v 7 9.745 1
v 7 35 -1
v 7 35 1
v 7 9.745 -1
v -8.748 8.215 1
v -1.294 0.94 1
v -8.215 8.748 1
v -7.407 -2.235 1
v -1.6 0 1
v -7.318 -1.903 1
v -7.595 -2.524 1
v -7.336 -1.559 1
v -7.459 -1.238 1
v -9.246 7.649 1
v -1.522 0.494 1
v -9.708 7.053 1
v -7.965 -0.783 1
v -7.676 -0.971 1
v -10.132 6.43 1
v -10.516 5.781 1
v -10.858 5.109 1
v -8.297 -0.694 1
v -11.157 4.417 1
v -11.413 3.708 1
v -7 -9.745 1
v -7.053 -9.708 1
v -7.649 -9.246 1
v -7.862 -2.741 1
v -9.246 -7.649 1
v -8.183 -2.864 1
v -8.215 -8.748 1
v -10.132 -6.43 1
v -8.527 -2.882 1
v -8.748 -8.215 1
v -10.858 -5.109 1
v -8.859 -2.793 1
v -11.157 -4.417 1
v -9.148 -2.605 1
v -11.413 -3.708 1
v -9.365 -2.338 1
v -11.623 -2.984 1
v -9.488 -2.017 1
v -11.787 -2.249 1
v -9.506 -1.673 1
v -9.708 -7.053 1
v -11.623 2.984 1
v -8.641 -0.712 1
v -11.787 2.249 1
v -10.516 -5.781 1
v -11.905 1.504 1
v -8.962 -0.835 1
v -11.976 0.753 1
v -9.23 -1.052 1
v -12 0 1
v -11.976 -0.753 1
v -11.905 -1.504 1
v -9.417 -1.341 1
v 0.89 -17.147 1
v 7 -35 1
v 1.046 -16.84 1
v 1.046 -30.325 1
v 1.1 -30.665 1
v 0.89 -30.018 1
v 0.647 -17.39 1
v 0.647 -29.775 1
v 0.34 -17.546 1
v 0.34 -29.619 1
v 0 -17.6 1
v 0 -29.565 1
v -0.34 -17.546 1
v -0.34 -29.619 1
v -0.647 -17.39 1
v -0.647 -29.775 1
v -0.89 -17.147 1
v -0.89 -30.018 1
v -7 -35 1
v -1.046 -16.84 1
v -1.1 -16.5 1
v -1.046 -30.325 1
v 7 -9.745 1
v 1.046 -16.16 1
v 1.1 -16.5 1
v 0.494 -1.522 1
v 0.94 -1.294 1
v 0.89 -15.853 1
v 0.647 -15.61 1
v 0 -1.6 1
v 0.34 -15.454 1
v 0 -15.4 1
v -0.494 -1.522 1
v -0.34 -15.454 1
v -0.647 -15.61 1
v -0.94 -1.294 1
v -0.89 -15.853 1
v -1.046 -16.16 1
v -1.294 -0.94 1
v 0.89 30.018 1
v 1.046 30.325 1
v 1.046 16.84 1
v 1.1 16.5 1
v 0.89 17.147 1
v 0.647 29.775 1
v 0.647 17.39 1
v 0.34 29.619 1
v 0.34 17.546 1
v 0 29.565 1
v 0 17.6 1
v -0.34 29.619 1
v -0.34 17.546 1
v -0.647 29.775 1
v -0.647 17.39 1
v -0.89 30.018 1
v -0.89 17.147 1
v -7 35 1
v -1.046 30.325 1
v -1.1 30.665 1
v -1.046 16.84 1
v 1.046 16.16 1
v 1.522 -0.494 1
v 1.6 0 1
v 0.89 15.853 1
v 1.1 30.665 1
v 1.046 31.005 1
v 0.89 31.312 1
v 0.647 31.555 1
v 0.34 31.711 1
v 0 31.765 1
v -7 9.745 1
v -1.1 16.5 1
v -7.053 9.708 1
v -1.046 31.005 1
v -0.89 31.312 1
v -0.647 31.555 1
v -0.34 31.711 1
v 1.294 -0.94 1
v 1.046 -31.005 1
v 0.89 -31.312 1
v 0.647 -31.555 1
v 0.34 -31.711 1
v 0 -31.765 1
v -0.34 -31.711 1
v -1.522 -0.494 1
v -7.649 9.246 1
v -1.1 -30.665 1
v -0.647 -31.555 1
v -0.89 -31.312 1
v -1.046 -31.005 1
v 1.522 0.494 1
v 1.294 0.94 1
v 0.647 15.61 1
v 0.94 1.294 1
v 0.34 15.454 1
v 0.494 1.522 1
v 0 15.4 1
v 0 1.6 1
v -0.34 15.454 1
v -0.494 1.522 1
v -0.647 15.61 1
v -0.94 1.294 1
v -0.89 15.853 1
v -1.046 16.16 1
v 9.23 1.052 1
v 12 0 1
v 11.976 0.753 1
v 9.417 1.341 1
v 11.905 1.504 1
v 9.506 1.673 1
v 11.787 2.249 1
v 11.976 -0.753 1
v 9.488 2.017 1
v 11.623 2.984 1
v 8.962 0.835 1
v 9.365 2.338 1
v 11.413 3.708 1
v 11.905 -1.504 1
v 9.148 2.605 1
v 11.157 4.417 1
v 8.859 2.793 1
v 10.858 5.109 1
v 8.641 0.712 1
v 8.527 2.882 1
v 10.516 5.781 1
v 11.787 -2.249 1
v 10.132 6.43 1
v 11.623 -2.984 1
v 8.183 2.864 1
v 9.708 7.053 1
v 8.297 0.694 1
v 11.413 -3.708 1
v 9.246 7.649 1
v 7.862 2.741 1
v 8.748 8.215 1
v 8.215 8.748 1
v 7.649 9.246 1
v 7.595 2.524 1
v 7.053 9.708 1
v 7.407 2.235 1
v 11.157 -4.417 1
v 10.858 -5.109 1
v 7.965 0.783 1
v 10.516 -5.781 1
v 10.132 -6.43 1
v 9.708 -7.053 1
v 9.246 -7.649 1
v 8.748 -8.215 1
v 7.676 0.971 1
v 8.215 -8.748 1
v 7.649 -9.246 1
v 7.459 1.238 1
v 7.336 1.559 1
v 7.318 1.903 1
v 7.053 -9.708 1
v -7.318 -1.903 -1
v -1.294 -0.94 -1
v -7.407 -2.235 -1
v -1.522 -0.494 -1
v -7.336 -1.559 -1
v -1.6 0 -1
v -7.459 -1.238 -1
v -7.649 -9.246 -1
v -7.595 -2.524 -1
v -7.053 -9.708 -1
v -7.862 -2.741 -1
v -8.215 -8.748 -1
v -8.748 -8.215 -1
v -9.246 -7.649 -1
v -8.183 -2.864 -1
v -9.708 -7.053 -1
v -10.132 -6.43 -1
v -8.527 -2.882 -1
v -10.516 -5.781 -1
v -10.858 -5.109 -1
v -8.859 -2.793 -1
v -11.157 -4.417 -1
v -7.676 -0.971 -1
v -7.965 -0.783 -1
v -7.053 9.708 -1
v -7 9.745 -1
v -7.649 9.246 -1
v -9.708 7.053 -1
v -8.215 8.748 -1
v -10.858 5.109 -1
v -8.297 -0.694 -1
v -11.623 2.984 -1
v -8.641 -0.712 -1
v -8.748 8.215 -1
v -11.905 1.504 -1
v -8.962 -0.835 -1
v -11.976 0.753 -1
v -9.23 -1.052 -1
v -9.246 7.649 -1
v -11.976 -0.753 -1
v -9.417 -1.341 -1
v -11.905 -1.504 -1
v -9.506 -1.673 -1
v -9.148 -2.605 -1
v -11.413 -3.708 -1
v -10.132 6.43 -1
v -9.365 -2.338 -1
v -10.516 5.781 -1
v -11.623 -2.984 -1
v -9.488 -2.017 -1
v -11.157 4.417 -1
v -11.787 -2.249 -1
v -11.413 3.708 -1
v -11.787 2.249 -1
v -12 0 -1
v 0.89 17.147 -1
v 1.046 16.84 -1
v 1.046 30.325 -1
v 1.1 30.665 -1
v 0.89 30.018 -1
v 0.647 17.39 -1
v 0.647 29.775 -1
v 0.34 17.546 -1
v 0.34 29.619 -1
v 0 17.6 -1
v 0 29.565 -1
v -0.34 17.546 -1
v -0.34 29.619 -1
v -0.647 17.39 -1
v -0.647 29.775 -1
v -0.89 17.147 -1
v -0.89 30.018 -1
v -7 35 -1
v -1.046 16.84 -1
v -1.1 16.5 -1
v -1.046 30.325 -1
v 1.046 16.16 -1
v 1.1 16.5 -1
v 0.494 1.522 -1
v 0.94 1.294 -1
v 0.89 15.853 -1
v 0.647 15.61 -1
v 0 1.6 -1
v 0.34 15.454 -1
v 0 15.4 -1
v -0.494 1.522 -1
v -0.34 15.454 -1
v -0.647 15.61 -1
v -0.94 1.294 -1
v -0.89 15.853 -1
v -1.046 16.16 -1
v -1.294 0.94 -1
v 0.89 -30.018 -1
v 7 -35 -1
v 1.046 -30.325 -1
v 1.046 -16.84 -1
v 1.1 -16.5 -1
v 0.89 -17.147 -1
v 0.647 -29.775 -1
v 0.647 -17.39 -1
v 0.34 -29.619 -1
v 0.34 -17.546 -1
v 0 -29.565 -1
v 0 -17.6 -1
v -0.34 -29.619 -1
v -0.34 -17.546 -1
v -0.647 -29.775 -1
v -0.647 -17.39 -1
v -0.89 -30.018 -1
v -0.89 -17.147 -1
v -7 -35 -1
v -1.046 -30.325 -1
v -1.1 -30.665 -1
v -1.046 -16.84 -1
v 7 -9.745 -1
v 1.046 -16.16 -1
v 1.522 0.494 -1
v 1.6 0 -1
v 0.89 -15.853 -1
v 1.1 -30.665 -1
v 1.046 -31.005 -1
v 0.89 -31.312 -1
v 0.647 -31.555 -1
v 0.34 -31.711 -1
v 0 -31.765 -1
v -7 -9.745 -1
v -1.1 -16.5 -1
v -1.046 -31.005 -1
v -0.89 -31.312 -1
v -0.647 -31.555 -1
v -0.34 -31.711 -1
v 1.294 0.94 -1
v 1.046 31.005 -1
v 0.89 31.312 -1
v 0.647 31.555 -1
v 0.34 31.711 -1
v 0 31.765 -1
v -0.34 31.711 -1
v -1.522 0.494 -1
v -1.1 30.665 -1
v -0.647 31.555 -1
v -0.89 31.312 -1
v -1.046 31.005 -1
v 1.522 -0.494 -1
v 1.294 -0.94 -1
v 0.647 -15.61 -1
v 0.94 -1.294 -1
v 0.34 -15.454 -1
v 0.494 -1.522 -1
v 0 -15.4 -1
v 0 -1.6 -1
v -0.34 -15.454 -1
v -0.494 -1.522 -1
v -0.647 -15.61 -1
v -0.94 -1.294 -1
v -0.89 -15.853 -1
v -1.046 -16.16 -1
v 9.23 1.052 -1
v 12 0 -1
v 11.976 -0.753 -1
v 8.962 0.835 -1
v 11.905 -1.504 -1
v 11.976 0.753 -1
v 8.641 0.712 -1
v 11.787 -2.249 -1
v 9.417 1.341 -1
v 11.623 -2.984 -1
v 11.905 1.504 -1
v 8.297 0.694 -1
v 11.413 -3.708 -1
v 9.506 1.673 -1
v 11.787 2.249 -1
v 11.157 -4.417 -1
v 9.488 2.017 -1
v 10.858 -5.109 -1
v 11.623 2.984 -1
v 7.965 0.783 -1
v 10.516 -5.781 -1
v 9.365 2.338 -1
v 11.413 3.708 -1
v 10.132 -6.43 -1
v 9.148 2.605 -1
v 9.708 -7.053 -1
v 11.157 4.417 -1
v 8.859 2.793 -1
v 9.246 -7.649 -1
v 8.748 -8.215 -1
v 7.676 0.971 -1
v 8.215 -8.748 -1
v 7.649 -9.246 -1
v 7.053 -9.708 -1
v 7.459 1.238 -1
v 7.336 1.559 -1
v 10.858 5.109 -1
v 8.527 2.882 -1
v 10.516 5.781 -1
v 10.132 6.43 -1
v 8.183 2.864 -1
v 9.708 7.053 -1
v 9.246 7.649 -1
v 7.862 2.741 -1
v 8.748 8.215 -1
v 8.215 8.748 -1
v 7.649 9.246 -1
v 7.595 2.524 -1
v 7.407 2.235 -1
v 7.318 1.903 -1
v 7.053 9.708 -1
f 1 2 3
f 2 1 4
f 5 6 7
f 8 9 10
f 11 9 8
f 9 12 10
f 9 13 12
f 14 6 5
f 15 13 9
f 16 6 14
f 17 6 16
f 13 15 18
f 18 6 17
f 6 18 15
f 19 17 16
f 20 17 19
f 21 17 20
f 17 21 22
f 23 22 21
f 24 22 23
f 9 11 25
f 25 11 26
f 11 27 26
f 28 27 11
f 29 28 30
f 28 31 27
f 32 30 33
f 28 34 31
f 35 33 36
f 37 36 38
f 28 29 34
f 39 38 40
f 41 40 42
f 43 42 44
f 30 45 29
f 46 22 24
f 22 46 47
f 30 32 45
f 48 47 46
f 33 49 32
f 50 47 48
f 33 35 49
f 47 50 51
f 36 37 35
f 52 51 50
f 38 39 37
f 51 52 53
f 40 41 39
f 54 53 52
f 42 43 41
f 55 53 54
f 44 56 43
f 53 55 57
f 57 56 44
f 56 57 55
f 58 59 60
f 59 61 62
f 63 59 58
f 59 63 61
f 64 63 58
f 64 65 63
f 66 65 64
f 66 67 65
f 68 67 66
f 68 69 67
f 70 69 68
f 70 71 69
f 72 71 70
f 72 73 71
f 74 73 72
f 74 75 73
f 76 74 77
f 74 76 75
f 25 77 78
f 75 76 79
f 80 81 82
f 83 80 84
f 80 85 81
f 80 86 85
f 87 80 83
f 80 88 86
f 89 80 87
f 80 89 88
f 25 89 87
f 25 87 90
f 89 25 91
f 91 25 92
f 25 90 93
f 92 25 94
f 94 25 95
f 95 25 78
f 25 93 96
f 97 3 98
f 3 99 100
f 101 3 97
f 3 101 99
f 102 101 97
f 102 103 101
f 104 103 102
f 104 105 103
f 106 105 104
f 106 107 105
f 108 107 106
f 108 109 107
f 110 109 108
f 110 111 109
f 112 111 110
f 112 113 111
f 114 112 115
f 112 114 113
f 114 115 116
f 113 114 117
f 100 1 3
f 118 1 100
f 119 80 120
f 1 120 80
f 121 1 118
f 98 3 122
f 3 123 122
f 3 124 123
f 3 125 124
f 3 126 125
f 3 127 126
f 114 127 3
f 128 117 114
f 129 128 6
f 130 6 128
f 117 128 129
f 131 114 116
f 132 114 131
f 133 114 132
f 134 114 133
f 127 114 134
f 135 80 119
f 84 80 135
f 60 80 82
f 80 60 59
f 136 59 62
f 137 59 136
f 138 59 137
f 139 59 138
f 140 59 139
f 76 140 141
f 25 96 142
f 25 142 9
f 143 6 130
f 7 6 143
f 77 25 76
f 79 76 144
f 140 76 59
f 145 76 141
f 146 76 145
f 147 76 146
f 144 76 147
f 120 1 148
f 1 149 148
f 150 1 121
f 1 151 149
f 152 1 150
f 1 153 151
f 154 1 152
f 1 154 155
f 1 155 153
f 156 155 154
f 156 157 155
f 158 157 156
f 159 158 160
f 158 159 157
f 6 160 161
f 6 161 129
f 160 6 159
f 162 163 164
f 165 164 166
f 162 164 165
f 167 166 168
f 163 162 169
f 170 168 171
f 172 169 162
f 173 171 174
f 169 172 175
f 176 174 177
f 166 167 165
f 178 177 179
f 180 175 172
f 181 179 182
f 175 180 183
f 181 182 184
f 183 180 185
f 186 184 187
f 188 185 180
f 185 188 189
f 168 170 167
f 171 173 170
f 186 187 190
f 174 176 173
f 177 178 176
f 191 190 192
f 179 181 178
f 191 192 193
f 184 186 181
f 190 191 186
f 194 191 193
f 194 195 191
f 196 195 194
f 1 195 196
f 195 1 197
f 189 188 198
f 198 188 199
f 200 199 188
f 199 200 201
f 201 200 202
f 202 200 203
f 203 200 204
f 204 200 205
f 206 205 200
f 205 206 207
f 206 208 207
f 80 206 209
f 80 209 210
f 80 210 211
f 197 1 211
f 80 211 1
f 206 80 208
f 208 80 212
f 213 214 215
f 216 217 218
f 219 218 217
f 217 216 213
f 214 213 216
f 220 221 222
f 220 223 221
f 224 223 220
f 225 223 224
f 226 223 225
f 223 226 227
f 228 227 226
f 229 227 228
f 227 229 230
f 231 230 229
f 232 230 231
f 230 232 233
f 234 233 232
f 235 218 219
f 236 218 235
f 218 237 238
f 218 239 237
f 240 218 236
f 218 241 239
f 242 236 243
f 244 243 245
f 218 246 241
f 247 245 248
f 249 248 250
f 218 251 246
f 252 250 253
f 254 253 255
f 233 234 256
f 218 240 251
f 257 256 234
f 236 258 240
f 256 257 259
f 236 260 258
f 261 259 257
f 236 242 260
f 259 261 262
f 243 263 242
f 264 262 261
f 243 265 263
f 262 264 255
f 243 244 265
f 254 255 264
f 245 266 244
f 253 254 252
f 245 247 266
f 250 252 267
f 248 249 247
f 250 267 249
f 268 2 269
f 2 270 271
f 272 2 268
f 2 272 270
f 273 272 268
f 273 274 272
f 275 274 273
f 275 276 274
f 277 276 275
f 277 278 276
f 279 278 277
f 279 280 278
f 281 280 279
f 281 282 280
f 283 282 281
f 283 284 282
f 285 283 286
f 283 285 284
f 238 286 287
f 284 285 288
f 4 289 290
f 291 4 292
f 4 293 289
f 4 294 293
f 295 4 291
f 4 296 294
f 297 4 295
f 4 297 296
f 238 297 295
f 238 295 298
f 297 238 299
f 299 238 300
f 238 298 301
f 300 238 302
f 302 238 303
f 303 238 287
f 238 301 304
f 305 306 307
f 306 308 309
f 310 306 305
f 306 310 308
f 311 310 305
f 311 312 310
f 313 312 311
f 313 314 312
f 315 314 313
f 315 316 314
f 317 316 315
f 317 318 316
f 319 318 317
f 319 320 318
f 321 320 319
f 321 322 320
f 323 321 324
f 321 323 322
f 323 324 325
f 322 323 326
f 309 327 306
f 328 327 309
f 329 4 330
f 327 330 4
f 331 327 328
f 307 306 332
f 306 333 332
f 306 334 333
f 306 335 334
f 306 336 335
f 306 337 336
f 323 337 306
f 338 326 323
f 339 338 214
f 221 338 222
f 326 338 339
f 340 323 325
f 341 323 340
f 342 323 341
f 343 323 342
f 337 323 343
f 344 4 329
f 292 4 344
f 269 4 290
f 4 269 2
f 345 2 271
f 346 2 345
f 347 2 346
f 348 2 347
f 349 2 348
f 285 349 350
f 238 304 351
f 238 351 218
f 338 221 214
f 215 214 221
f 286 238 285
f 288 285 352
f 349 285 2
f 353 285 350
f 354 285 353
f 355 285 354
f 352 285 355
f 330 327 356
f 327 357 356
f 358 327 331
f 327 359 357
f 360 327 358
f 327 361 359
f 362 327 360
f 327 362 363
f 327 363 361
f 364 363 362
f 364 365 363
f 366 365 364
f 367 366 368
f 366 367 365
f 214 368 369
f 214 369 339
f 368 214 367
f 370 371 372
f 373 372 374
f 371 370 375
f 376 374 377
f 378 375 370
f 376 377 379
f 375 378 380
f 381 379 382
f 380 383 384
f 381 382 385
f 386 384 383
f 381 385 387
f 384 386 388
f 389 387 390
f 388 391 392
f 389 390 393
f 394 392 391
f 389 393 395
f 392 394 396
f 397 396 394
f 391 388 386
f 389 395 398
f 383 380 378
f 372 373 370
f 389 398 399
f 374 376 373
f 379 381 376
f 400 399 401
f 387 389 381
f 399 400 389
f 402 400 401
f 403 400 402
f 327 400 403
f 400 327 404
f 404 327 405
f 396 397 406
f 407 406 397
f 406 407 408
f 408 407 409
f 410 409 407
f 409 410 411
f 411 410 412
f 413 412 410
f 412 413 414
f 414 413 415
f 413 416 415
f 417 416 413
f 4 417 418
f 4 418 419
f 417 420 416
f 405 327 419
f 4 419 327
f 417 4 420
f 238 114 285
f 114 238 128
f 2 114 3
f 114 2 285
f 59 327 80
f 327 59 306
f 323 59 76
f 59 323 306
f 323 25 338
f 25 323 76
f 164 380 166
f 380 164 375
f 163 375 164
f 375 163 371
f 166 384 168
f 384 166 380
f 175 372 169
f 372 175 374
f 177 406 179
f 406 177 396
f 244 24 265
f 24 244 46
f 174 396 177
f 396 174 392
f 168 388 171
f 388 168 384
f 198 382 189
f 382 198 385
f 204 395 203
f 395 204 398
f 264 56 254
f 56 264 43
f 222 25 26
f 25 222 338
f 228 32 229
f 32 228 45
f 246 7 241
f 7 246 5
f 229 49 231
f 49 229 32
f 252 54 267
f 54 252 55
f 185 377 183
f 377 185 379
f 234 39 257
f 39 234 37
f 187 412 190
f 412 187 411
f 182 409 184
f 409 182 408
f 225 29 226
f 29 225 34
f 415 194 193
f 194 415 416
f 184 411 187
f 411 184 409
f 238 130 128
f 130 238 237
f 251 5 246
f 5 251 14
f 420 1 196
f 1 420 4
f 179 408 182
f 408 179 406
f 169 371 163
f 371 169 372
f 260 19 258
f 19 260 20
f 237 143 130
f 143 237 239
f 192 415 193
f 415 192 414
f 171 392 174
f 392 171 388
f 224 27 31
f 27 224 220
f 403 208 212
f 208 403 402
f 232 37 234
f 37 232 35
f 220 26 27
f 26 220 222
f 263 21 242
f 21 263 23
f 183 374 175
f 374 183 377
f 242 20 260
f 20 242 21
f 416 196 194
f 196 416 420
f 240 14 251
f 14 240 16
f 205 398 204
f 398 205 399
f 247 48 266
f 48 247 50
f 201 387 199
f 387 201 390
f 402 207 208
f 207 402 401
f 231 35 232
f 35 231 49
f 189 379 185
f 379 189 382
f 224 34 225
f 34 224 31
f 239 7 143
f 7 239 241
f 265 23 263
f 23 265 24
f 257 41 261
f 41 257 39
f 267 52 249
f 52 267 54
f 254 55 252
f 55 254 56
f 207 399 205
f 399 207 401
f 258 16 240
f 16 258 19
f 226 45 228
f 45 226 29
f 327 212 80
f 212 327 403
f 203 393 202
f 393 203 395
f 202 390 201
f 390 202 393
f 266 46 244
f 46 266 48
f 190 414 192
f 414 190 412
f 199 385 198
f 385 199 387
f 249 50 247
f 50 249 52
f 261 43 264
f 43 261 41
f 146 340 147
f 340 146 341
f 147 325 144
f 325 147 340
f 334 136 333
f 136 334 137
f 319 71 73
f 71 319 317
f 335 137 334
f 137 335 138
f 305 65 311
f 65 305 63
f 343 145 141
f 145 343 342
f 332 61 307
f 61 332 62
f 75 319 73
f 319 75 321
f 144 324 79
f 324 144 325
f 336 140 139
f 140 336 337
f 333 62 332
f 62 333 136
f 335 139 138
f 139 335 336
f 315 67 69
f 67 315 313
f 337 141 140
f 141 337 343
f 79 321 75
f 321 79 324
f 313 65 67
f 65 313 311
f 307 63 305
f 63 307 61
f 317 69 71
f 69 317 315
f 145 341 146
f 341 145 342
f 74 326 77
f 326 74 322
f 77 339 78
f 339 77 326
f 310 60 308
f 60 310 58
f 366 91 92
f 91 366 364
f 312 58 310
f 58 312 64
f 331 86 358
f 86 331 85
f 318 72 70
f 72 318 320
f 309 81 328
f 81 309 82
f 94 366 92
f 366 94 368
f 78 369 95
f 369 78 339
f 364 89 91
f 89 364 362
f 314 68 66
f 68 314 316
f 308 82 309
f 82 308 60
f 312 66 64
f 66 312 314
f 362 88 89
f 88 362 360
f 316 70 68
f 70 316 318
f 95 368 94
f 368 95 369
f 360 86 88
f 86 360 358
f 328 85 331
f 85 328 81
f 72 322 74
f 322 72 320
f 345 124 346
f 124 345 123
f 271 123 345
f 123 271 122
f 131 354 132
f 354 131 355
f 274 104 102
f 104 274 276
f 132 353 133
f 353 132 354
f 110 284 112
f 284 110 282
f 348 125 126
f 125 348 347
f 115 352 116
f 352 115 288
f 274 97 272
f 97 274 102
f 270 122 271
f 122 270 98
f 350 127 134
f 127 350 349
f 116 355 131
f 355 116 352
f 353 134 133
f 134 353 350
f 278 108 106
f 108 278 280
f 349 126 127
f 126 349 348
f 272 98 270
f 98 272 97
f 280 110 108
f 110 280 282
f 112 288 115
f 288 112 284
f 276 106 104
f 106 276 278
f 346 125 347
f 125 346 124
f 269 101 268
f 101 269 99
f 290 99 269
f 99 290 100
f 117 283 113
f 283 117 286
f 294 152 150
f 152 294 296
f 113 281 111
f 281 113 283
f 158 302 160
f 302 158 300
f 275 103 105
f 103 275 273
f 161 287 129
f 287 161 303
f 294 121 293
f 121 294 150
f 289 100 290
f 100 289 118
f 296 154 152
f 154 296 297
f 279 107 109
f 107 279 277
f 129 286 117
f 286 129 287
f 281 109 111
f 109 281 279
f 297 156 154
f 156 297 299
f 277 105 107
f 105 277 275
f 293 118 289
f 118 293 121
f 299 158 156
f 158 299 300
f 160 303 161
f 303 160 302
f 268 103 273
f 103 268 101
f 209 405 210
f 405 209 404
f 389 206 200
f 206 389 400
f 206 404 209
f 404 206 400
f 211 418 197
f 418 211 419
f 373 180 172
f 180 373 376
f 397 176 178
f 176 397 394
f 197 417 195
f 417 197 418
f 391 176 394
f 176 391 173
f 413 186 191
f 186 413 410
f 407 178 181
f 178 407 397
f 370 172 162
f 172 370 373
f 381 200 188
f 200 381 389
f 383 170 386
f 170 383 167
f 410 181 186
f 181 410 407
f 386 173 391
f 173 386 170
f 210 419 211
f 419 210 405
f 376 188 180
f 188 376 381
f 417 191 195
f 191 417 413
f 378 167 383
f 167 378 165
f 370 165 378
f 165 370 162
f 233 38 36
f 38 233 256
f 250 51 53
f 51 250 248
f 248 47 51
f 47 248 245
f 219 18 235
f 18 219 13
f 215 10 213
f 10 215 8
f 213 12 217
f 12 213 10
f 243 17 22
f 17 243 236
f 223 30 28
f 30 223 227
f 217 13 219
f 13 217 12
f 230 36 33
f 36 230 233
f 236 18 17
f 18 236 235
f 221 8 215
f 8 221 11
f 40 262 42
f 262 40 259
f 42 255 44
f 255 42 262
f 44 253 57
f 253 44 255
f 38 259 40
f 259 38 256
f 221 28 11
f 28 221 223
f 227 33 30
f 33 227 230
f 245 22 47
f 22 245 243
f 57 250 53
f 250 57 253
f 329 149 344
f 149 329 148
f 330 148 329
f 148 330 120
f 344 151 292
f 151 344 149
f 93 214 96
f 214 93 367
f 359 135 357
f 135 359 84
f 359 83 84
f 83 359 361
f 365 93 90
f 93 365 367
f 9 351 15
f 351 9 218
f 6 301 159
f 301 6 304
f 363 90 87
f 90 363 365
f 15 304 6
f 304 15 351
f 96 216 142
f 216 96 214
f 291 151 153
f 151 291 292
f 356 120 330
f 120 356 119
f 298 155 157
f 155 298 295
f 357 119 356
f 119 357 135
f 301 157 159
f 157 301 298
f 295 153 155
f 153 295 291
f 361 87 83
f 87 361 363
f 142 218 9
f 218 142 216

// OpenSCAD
// file: ../../parameters.scad
global_clearance = 0.5;


//Main tube diameter - hole [mm]
main_tube_outer_diameter = 25.4;
main_tube_inner_diameter = 23.05;

// Nastavení parametrů rotoru

gliding_aggle = 14;         // tenhle úhel by se zřejmě v budoucnu měl počítat z požadované klouzavosti.

rotor_blade_AOA = 1.5;      // nastavení úhlu náběhu rotorového listu
rotor_blade_length = 970;   // délka rotorového listu
rotor_blade_depth = 50;     // hloubka rotorového listu
rotor_height = 180;         // výška otočného kloubu rotoru nad hlavní trubkou vírníku (odhad)
rotor_blades_count = 2;
rotor_delta_angle = 12;


rotor_head_width =  21.4;    //Rozměr 1 v nákresu
pilon_wall_thickness = 4.2;  // Rozměr 2 v nákresu
horizontal_screw_distance = 14.5;   // Rozměr 4 v nákresu
vertical_screw_distance = 12;       // rozměr 5 v nkresu

rotorhead_wall_thickness = 2; // sila tistenych dilu


bearing_outer_diameter = 7.1;    // Rozměr B1 v nákresu s přídavkem na toleranci otvoru
bearing_thickness = 3.1;        // Rozměr B2 v nákresu
bearing_shaft_length = 19.5;    // Rozměr B3 v nákresu


// nastavení parametrů motoru

engine_angle = -8;
engine_diameter = 55;
engine_offset = 55;

engine_screws_radius = 15;
engine_holes_radius = (24 + 44)/4;
engine_shatf_hole_diameter = 13;

// screw length step - minimum difference in length between two types of screws
basic_screw_length = 5;

//Screw diameter and nut for M5 [mm]
M5_screw_diameter=5.5;
M5_head_height = 5;
M5_head_diameter = 13+0.5;
M5_nut_height = 4.5;
M5_nut_diameter = 9.4;
M5_nut_pocket = 8.4;

//Screw diameter and nut for M4 [mm]
M4_screw_diameter=4.5;
M4_screw_head_height = 4;
M4_nut_height = 3.2;
M4_nut_diameter = 8.4;
M4_nut_pocket = 7.5;

//Screw diameter and nut for M3 [mm]
M3_screw_diameter = 3.2;
M3_nut_height = 2.7;
M3_nut_diameter = 6.6;
M3_screw_head_height = 3;
M3_nut_pocket = 5.6;


//Screw diameter and nut for M2,5 [mm]
M2_5_screw_diameter = 2.7;
M2_5_nut_height = 2.3;
M2_5_nut_diameter = 6;
M2_5_nut_pocket = 5.1;

//Screw diameter and nut for M2 [mm]
M2_screw_diameter = 2.2;
M2_nut_height = 1.8;
M2_nut_diameter = 4.5;
M2_nut_pocket = 3.95;



//šroub servo
Servo_screw = 1.5;
Servo_nut_height = 1;
Servo_nut_diameter = 2.7;



//center_of_gravity_position = [main_pilon_position - tan(gliding_aggle)*rotor_height, 0, 0];


////podzvozek

radius_undercarriage = 25;
vzdalenost_x = tan(20) * 131;
vzdalenost_y = (131 - radius_undercarriage)/tan(79);
uhel_y = 90 - 20;
uhel_x = 90 - 79;

maximum_printable_size = 150;


////Pitotova trubice
Pitot_tube_diameter = 4.02 + 1;
Distance_hole_from_tube = 11.92;  //vzdálenost otvoru pro připevnění od samotné trubičky
// file: ../888_1001.scad
//
//
//

include <../parameters.scad>

module 888_1001()
{
    angle_between_blades = 360 / rotor_blades_count;
    rotor_center_plate_size = 30;
    rotor_mounting_plate_size = 20;
    shaft_diameter = M3_screw_diameter;
    thickness = 2;
    blade_screws_distance = (16.47+11.86)/2;

    difference () {
        union () {
            cylinder(r = 3+9, h = thickness, center = true, $fn = 100);

            for (i = [0:rotor_blades_count]){
                rotate([0,0, i*angle_between_blades])
                    translate([0, 20, 0])
                        cube([14, 30, thickness], center = true);
            }
        }

        cylinder(d = shaft_diameter, h = 2* thickness, center = true, $fn = 20);


        for (i = [1:rotor_blades_count]){
            rotate([0,0, i*angle_between_blades])
                translate([0, 16.5 + blade_screws_distance/2, 0]) {
                    translate([0, blade_screws_distance/2, 0])
                        cylinder(d = M2_screw_diameter, h = 2* thickness, center = true, $fn = 20);
                    translate([0, -blade_screws_distance/2, 0])
                        cylinder(d = M2_screw_diameter, h = 2* thickness, center = true, $fn = 20);
                }
        }

        rotate([0,0, rotor_delta_angle])
        for (i = [1:rotor_blades_count]){
            rotate([0,0, i*angle_between_blades + angle_between_blades/2])
                translate([0, 3 + 4.5 + M2_screw_diameter/2, 0])
                    cylinder(d = M2_screw_diameter, h = 2* thickness, center = true, $fn = 20);
        }
    }
}

888_1001();
// main file
//
//
//

use <../888_1001.scad>

888_1001(hole_diameter=3);
